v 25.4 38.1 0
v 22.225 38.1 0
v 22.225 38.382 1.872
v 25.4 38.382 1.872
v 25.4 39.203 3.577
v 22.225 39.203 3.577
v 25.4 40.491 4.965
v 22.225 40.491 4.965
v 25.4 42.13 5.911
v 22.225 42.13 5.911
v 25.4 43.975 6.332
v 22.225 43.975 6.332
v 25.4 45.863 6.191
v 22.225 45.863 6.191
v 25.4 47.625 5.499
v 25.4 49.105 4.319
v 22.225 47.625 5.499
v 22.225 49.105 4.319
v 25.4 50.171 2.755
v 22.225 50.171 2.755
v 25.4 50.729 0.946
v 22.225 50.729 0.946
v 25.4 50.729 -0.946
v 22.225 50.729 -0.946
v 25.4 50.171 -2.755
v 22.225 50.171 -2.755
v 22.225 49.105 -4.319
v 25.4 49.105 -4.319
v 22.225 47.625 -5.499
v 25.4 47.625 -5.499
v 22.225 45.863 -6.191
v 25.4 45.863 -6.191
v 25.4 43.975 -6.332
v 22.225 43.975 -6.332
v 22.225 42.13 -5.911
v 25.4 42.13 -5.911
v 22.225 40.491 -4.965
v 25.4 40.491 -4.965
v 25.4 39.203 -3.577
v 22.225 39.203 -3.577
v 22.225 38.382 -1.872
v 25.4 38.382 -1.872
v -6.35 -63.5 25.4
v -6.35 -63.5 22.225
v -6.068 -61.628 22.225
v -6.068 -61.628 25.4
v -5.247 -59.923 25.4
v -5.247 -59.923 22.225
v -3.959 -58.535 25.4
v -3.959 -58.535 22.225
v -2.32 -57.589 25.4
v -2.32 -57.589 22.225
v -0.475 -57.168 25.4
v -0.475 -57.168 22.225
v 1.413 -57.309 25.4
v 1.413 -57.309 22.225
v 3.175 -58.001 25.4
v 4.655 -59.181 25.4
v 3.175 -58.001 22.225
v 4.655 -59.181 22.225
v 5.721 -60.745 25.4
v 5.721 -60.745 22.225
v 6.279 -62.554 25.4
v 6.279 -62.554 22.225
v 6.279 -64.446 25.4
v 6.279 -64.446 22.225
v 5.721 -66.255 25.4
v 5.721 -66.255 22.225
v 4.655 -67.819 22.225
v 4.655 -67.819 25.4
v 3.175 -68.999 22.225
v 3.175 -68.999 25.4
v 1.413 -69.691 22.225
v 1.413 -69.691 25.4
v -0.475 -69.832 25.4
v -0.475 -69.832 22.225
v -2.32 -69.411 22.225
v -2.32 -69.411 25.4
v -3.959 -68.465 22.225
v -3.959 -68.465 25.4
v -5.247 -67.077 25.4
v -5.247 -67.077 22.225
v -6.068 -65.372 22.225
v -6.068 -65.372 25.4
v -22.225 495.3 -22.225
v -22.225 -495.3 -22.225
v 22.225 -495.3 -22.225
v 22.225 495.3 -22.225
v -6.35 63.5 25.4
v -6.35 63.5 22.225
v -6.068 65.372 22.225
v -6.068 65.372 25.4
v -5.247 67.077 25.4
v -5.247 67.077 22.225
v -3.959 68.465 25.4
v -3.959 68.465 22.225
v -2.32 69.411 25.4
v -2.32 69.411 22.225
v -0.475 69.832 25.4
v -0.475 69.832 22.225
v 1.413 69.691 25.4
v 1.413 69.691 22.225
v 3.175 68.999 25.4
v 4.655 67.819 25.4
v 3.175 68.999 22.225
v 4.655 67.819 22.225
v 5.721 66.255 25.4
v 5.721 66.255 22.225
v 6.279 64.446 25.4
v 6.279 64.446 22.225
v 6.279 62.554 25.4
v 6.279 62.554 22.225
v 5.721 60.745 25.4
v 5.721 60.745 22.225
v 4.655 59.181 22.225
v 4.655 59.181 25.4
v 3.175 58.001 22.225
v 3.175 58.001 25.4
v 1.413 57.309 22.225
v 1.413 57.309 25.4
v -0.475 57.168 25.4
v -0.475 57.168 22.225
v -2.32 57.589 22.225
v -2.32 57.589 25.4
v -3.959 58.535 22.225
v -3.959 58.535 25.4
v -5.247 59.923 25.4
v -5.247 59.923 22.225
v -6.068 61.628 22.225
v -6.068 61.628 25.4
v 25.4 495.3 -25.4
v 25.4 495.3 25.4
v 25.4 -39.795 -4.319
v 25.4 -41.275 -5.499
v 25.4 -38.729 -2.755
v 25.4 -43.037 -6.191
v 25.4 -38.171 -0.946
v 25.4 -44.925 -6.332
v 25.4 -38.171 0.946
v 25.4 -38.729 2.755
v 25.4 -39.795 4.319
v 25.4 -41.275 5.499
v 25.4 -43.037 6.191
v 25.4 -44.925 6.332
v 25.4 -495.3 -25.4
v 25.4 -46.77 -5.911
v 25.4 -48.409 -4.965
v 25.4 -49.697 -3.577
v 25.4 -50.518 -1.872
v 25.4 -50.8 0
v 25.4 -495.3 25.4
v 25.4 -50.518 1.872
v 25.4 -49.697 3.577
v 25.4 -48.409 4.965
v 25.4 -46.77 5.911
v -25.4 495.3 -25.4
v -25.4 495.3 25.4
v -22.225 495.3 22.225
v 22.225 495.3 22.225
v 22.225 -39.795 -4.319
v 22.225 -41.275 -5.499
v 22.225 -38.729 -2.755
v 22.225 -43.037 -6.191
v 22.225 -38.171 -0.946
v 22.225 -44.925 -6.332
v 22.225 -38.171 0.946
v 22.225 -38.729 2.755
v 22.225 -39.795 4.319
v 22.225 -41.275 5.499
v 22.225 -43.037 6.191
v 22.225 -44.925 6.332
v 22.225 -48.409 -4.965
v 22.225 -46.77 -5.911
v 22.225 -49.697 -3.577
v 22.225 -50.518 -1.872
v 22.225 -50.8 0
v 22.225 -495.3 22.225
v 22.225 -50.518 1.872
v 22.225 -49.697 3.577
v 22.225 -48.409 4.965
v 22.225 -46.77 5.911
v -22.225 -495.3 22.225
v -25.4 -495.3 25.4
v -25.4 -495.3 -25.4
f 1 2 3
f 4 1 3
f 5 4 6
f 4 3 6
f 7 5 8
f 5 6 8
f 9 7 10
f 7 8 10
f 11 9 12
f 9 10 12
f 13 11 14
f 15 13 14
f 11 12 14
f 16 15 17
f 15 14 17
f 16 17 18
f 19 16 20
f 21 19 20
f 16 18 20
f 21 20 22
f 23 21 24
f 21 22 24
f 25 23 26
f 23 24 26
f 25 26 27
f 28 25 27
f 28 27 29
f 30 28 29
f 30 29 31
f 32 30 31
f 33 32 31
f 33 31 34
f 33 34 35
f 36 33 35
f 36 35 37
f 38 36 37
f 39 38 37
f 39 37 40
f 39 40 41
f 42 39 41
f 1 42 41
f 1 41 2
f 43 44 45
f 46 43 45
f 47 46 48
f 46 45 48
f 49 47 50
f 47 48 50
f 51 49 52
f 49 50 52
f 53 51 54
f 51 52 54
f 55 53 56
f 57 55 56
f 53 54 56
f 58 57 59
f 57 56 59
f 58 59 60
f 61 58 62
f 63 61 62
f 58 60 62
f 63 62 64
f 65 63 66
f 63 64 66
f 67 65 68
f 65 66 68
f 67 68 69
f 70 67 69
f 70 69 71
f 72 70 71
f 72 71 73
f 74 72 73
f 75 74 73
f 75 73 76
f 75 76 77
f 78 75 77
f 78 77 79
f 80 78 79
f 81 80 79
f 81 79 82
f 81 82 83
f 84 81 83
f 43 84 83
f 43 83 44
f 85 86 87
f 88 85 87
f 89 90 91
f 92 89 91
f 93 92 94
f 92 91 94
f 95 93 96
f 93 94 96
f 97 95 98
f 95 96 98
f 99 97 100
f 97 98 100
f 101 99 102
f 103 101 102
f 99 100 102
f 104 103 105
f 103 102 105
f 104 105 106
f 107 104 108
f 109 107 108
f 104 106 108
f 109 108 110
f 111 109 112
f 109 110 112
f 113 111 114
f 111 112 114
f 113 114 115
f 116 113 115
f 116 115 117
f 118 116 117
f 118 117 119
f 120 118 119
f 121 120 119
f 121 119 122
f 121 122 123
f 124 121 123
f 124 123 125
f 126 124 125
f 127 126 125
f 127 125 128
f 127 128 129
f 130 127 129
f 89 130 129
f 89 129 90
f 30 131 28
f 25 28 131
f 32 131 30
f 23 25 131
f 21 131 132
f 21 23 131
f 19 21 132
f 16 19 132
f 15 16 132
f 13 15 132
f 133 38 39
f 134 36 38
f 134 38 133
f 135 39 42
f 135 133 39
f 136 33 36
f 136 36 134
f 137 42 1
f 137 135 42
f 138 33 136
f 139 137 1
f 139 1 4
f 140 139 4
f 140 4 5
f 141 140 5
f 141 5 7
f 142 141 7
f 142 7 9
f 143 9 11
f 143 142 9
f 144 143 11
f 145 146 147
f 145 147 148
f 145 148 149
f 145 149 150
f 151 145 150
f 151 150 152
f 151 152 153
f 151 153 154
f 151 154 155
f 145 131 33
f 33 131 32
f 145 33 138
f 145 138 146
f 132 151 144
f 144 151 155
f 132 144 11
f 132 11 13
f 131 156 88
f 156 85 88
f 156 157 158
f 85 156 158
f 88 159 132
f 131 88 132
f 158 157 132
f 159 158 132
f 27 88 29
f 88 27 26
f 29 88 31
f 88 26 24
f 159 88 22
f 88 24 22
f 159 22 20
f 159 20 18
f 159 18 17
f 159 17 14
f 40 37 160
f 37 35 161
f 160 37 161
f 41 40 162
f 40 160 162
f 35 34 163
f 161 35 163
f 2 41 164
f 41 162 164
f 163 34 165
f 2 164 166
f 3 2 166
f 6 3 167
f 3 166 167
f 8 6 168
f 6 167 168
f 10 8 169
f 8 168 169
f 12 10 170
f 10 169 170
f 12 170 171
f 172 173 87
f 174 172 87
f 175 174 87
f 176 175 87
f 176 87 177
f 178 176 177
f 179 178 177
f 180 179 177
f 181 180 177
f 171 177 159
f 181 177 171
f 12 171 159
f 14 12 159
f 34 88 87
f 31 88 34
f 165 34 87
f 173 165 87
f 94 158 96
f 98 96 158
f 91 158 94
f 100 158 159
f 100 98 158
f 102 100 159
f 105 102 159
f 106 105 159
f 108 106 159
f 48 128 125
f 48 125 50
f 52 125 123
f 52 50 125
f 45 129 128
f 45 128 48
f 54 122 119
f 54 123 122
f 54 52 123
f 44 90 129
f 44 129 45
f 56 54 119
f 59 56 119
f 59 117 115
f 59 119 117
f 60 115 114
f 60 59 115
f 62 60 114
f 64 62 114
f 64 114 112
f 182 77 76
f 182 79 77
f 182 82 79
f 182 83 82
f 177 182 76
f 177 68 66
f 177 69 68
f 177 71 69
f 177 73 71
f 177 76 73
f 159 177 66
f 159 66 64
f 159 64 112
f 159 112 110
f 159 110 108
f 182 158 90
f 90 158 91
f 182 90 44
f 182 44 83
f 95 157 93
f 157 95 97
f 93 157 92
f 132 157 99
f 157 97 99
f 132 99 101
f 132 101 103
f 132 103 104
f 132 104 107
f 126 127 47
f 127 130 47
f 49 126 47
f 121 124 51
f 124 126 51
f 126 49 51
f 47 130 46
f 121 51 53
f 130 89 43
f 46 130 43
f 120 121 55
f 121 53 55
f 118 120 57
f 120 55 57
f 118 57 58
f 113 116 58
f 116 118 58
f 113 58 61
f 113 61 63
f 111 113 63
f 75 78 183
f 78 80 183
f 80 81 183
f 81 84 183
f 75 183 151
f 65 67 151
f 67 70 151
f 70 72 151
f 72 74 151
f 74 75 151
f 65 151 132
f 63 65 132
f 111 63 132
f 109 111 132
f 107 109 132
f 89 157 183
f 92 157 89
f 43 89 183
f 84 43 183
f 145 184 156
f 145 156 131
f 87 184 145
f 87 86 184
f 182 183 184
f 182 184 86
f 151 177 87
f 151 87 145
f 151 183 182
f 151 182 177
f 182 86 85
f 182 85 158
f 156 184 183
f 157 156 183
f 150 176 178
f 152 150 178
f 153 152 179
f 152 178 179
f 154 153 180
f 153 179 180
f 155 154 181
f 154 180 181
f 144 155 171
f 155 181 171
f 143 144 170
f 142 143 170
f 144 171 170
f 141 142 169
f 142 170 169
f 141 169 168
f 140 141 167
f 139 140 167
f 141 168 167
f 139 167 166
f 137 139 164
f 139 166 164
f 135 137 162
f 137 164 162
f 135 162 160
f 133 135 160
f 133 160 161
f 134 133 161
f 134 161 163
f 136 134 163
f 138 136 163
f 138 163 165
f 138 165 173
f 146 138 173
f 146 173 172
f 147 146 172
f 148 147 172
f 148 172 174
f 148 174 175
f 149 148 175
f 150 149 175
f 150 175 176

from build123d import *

# Parameters (mm, degrees)
F0_W     = 50.8
F0_H     = 50.8
F0_W_2   = 44.45
F0_H_2   = 44.45
F1_DEPTH = 495.3
F3_D     = 12.7
F3_DEPTH = 12.7
F3_TIP   = 3.8154649308
F5_D     = 12.7
F5_DEPTH = 12.7
F5_TIP   = 3.8154649308


# Not quite as in the source:
# - a length typed as a fraction of an inch, garbled in the dataset ("3 / 203.2 mm" for 3/8 in), is restored


with BuildPart() as f1:
    # F0 (on Front) → F1 (new body, symmetric)
    with BuildSketch(Plane.XZ):
        Rectangle(F0_W, F0_H)
        Rectangle(F0_W_2, F0_H_2, mode=Mode.SUBTRACT)
    extrude(amount=F1_DEPTH, both=True)

    # F3
    with Locations(Plane.XY.offset(25.4)):
        with Locations((0, 63.5), (0, -63.5)):
            Hole(F3_D / 2, depth=F3_DEPTH)
            with Locations((0, 0, -(F3_DEPTH + F3_TIP / 2))):  # 118° drill point
                Cone(0, F3_D / 2, F3_TIP, mode=Mode.SUBTRACT)

    # F5
    with Locations(Plane.YZ.offset(25.4)):
        with Locations((44.45, 0), (-44.45, 0)):
            Hole(F5_D / 2, depth=F5_DEPTH)
            with Locations((0, 0, -(F5_DEPTH + F5_TIP / 2))):  # 118° drill point
                Cone(0, F5_D / 2, F5_TIP, mode=Mode.SUBTRACT)


solid = f1.part
